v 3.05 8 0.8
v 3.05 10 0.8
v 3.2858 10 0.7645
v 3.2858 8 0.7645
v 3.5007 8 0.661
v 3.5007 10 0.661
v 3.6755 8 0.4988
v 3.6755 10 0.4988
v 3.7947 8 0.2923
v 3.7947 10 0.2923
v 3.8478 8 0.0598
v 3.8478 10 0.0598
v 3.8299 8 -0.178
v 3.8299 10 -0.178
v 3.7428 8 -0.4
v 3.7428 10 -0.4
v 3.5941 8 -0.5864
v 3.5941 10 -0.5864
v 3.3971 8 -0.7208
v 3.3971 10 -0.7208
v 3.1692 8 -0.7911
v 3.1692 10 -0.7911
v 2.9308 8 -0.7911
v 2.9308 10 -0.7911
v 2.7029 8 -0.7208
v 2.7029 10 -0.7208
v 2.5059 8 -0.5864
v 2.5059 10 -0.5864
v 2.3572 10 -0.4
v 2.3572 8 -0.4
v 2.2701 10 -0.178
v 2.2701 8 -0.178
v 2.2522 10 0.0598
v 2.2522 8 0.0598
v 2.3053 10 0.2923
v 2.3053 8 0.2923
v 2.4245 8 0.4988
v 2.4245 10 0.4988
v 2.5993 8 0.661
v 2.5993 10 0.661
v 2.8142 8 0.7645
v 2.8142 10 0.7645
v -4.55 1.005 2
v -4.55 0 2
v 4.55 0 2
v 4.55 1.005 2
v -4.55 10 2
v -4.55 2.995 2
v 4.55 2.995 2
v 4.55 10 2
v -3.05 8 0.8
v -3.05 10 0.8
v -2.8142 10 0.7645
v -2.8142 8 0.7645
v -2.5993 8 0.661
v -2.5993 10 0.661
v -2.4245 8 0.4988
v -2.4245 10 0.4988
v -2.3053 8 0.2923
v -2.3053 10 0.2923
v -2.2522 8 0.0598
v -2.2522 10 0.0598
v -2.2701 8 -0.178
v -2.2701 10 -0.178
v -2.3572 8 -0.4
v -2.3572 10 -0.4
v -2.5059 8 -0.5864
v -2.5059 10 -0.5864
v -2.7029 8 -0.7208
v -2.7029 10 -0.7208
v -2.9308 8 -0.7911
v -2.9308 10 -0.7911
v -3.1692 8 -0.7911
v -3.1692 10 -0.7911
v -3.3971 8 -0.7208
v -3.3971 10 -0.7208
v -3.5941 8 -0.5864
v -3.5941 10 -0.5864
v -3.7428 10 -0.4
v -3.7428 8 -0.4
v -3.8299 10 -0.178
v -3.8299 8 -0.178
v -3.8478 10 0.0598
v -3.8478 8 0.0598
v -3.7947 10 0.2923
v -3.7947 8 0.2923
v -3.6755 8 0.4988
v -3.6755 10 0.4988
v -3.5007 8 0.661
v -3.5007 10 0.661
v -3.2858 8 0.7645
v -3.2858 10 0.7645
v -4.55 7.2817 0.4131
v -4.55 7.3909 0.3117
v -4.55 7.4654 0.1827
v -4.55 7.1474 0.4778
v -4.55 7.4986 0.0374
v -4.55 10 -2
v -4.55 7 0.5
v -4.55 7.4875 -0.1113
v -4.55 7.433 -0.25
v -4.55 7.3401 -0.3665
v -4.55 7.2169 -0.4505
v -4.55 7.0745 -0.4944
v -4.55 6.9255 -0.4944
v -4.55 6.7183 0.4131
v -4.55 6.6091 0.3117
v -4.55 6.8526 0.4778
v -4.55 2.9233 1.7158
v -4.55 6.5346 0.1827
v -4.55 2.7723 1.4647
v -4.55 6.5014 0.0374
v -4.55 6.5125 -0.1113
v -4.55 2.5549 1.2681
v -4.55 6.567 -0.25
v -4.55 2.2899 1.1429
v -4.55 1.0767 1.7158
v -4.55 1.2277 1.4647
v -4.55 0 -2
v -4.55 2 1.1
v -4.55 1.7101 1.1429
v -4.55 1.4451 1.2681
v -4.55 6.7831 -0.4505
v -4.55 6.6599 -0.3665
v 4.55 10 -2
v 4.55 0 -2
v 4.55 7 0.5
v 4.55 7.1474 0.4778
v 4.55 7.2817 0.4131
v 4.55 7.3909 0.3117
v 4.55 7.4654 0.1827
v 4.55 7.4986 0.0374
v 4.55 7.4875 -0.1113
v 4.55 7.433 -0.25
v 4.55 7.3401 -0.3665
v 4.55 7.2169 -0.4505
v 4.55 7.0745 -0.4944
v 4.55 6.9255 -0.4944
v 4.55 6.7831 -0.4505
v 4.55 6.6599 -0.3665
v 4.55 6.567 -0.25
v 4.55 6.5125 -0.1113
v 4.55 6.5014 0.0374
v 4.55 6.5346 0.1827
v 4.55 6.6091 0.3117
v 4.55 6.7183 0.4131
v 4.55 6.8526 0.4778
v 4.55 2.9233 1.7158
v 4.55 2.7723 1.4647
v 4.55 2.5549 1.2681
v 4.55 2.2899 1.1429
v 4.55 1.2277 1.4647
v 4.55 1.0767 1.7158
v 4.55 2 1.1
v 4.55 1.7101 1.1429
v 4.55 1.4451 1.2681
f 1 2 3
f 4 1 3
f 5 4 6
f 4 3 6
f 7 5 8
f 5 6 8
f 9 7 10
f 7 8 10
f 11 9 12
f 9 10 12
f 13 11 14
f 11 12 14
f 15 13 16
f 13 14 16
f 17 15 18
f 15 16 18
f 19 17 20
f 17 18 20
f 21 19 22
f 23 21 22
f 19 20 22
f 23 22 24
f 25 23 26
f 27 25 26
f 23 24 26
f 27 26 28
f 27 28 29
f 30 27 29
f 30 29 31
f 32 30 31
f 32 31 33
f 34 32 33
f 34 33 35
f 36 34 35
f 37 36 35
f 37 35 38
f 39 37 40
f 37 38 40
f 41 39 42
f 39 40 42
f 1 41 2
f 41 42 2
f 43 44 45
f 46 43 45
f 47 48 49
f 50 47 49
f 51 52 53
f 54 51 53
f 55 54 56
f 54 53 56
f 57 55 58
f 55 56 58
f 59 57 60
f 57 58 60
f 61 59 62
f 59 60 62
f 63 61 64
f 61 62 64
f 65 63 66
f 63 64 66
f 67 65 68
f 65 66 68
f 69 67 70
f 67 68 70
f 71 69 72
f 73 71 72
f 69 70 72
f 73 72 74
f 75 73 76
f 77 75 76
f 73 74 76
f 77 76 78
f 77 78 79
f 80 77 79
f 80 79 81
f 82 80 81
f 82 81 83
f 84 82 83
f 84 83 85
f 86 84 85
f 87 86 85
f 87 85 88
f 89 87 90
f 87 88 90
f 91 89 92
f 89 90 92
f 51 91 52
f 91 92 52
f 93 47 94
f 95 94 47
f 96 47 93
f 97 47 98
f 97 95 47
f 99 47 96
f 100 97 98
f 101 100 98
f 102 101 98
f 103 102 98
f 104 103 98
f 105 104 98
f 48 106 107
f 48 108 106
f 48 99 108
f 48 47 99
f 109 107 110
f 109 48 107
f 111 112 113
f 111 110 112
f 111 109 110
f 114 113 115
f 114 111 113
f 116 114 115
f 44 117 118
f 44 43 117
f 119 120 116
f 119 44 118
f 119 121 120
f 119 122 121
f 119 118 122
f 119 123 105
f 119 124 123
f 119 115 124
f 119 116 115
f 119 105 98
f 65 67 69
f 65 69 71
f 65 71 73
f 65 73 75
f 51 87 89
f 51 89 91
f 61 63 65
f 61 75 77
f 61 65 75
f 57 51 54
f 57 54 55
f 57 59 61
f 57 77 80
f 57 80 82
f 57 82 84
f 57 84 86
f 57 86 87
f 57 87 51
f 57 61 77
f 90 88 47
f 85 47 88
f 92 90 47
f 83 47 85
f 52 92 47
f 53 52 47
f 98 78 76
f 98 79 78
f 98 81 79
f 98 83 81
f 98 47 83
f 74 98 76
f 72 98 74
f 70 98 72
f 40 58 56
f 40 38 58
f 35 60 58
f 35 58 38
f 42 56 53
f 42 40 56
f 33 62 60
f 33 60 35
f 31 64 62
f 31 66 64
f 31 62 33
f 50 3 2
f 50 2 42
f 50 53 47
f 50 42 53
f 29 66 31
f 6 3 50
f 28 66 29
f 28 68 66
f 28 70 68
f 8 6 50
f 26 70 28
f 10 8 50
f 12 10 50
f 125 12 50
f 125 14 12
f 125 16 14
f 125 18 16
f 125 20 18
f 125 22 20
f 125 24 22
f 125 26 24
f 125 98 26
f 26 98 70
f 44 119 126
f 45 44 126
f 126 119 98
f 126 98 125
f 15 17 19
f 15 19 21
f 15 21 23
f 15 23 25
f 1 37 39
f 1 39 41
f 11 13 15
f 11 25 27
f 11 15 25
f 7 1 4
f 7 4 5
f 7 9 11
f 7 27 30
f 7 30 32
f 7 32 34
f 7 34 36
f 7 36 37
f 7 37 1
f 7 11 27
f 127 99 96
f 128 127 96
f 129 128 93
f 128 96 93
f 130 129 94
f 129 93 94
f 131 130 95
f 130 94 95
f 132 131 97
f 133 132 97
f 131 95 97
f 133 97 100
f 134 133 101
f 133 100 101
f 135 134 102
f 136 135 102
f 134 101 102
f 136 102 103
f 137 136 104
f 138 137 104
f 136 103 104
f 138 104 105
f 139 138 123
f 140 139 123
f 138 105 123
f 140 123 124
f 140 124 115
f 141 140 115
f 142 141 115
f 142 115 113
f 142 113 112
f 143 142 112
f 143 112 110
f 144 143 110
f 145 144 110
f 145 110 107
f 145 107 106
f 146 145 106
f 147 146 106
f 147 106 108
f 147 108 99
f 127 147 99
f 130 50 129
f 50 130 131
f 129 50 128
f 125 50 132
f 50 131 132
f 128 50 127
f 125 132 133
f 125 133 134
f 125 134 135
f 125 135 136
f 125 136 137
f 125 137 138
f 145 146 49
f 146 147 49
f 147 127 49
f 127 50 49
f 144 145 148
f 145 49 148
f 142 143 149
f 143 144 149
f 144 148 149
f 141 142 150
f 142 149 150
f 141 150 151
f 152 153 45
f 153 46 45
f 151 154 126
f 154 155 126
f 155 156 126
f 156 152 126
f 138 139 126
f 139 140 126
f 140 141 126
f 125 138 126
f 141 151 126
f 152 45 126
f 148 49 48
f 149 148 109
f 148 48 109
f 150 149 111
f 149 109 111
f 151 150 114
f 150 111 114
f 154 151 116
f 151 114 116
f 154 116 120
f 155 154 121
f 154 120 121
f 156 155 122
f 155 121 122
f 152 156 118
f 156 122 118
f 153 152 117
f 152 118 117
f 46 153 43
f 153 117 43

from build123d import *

# Parameters (mm, degrees)
SKETCH_1_W          = 9.1
SKETCH_1_H          = 4
EXTRUDE_1_DEPTH     = 10
SKETCH_2_R          = 0.5
SKETCH_2_R_2        = 1
CUT_EXTRUDE_1_DEPTH = 14.667845478
SKETCH_3_R          = 0.8
CUT_EXTRUDE_2_DEPTH = 2


with BuildPart() as part:
    # 草图1 → 凸台-拉伸1 (new body)
    with BuildSketch(Plane(origin=(0, 0, 0), x_dir=(1, 0, 0), z_dir=(0, 1, 0))):
        Rectangle(SKETCH_1_W, SKETCH_1_H)
    extrude(amount=EXTRUDE_1_DEPTH)

    # 草图2 → 切除-拉伸1 (cut, through all)
    with BuildSketch(Plane.ZY.offset(4.55)):
        with Locations((0, 7)):
            Circle(SKETCH_2_R)
        with Locations((2.1, 2)):
            Circle(SKETCH_2_R_2)
    extrude(amount=-CUT_EXTRUDE_1_DEPTH, mode=Mode.SUBTRACT)

    # 草图3 → 切除-拉伸2 (cut)
    with BuildSketch(Plane(origin=(0, 10, 0), x_dir=(1, 0, 0), z_dir=(0, 1, 0))):
        with Locations((3.05, 0)):
            Circle(SKETCH_3_R)
        with Locations((-3.05, 0)):
            Circle(SKETCH_3_R)
    extrude(amount=-CUT_EXTRUDE_2_DEPTH, mode=Mode.SUBTRACT)


solid = part.part
